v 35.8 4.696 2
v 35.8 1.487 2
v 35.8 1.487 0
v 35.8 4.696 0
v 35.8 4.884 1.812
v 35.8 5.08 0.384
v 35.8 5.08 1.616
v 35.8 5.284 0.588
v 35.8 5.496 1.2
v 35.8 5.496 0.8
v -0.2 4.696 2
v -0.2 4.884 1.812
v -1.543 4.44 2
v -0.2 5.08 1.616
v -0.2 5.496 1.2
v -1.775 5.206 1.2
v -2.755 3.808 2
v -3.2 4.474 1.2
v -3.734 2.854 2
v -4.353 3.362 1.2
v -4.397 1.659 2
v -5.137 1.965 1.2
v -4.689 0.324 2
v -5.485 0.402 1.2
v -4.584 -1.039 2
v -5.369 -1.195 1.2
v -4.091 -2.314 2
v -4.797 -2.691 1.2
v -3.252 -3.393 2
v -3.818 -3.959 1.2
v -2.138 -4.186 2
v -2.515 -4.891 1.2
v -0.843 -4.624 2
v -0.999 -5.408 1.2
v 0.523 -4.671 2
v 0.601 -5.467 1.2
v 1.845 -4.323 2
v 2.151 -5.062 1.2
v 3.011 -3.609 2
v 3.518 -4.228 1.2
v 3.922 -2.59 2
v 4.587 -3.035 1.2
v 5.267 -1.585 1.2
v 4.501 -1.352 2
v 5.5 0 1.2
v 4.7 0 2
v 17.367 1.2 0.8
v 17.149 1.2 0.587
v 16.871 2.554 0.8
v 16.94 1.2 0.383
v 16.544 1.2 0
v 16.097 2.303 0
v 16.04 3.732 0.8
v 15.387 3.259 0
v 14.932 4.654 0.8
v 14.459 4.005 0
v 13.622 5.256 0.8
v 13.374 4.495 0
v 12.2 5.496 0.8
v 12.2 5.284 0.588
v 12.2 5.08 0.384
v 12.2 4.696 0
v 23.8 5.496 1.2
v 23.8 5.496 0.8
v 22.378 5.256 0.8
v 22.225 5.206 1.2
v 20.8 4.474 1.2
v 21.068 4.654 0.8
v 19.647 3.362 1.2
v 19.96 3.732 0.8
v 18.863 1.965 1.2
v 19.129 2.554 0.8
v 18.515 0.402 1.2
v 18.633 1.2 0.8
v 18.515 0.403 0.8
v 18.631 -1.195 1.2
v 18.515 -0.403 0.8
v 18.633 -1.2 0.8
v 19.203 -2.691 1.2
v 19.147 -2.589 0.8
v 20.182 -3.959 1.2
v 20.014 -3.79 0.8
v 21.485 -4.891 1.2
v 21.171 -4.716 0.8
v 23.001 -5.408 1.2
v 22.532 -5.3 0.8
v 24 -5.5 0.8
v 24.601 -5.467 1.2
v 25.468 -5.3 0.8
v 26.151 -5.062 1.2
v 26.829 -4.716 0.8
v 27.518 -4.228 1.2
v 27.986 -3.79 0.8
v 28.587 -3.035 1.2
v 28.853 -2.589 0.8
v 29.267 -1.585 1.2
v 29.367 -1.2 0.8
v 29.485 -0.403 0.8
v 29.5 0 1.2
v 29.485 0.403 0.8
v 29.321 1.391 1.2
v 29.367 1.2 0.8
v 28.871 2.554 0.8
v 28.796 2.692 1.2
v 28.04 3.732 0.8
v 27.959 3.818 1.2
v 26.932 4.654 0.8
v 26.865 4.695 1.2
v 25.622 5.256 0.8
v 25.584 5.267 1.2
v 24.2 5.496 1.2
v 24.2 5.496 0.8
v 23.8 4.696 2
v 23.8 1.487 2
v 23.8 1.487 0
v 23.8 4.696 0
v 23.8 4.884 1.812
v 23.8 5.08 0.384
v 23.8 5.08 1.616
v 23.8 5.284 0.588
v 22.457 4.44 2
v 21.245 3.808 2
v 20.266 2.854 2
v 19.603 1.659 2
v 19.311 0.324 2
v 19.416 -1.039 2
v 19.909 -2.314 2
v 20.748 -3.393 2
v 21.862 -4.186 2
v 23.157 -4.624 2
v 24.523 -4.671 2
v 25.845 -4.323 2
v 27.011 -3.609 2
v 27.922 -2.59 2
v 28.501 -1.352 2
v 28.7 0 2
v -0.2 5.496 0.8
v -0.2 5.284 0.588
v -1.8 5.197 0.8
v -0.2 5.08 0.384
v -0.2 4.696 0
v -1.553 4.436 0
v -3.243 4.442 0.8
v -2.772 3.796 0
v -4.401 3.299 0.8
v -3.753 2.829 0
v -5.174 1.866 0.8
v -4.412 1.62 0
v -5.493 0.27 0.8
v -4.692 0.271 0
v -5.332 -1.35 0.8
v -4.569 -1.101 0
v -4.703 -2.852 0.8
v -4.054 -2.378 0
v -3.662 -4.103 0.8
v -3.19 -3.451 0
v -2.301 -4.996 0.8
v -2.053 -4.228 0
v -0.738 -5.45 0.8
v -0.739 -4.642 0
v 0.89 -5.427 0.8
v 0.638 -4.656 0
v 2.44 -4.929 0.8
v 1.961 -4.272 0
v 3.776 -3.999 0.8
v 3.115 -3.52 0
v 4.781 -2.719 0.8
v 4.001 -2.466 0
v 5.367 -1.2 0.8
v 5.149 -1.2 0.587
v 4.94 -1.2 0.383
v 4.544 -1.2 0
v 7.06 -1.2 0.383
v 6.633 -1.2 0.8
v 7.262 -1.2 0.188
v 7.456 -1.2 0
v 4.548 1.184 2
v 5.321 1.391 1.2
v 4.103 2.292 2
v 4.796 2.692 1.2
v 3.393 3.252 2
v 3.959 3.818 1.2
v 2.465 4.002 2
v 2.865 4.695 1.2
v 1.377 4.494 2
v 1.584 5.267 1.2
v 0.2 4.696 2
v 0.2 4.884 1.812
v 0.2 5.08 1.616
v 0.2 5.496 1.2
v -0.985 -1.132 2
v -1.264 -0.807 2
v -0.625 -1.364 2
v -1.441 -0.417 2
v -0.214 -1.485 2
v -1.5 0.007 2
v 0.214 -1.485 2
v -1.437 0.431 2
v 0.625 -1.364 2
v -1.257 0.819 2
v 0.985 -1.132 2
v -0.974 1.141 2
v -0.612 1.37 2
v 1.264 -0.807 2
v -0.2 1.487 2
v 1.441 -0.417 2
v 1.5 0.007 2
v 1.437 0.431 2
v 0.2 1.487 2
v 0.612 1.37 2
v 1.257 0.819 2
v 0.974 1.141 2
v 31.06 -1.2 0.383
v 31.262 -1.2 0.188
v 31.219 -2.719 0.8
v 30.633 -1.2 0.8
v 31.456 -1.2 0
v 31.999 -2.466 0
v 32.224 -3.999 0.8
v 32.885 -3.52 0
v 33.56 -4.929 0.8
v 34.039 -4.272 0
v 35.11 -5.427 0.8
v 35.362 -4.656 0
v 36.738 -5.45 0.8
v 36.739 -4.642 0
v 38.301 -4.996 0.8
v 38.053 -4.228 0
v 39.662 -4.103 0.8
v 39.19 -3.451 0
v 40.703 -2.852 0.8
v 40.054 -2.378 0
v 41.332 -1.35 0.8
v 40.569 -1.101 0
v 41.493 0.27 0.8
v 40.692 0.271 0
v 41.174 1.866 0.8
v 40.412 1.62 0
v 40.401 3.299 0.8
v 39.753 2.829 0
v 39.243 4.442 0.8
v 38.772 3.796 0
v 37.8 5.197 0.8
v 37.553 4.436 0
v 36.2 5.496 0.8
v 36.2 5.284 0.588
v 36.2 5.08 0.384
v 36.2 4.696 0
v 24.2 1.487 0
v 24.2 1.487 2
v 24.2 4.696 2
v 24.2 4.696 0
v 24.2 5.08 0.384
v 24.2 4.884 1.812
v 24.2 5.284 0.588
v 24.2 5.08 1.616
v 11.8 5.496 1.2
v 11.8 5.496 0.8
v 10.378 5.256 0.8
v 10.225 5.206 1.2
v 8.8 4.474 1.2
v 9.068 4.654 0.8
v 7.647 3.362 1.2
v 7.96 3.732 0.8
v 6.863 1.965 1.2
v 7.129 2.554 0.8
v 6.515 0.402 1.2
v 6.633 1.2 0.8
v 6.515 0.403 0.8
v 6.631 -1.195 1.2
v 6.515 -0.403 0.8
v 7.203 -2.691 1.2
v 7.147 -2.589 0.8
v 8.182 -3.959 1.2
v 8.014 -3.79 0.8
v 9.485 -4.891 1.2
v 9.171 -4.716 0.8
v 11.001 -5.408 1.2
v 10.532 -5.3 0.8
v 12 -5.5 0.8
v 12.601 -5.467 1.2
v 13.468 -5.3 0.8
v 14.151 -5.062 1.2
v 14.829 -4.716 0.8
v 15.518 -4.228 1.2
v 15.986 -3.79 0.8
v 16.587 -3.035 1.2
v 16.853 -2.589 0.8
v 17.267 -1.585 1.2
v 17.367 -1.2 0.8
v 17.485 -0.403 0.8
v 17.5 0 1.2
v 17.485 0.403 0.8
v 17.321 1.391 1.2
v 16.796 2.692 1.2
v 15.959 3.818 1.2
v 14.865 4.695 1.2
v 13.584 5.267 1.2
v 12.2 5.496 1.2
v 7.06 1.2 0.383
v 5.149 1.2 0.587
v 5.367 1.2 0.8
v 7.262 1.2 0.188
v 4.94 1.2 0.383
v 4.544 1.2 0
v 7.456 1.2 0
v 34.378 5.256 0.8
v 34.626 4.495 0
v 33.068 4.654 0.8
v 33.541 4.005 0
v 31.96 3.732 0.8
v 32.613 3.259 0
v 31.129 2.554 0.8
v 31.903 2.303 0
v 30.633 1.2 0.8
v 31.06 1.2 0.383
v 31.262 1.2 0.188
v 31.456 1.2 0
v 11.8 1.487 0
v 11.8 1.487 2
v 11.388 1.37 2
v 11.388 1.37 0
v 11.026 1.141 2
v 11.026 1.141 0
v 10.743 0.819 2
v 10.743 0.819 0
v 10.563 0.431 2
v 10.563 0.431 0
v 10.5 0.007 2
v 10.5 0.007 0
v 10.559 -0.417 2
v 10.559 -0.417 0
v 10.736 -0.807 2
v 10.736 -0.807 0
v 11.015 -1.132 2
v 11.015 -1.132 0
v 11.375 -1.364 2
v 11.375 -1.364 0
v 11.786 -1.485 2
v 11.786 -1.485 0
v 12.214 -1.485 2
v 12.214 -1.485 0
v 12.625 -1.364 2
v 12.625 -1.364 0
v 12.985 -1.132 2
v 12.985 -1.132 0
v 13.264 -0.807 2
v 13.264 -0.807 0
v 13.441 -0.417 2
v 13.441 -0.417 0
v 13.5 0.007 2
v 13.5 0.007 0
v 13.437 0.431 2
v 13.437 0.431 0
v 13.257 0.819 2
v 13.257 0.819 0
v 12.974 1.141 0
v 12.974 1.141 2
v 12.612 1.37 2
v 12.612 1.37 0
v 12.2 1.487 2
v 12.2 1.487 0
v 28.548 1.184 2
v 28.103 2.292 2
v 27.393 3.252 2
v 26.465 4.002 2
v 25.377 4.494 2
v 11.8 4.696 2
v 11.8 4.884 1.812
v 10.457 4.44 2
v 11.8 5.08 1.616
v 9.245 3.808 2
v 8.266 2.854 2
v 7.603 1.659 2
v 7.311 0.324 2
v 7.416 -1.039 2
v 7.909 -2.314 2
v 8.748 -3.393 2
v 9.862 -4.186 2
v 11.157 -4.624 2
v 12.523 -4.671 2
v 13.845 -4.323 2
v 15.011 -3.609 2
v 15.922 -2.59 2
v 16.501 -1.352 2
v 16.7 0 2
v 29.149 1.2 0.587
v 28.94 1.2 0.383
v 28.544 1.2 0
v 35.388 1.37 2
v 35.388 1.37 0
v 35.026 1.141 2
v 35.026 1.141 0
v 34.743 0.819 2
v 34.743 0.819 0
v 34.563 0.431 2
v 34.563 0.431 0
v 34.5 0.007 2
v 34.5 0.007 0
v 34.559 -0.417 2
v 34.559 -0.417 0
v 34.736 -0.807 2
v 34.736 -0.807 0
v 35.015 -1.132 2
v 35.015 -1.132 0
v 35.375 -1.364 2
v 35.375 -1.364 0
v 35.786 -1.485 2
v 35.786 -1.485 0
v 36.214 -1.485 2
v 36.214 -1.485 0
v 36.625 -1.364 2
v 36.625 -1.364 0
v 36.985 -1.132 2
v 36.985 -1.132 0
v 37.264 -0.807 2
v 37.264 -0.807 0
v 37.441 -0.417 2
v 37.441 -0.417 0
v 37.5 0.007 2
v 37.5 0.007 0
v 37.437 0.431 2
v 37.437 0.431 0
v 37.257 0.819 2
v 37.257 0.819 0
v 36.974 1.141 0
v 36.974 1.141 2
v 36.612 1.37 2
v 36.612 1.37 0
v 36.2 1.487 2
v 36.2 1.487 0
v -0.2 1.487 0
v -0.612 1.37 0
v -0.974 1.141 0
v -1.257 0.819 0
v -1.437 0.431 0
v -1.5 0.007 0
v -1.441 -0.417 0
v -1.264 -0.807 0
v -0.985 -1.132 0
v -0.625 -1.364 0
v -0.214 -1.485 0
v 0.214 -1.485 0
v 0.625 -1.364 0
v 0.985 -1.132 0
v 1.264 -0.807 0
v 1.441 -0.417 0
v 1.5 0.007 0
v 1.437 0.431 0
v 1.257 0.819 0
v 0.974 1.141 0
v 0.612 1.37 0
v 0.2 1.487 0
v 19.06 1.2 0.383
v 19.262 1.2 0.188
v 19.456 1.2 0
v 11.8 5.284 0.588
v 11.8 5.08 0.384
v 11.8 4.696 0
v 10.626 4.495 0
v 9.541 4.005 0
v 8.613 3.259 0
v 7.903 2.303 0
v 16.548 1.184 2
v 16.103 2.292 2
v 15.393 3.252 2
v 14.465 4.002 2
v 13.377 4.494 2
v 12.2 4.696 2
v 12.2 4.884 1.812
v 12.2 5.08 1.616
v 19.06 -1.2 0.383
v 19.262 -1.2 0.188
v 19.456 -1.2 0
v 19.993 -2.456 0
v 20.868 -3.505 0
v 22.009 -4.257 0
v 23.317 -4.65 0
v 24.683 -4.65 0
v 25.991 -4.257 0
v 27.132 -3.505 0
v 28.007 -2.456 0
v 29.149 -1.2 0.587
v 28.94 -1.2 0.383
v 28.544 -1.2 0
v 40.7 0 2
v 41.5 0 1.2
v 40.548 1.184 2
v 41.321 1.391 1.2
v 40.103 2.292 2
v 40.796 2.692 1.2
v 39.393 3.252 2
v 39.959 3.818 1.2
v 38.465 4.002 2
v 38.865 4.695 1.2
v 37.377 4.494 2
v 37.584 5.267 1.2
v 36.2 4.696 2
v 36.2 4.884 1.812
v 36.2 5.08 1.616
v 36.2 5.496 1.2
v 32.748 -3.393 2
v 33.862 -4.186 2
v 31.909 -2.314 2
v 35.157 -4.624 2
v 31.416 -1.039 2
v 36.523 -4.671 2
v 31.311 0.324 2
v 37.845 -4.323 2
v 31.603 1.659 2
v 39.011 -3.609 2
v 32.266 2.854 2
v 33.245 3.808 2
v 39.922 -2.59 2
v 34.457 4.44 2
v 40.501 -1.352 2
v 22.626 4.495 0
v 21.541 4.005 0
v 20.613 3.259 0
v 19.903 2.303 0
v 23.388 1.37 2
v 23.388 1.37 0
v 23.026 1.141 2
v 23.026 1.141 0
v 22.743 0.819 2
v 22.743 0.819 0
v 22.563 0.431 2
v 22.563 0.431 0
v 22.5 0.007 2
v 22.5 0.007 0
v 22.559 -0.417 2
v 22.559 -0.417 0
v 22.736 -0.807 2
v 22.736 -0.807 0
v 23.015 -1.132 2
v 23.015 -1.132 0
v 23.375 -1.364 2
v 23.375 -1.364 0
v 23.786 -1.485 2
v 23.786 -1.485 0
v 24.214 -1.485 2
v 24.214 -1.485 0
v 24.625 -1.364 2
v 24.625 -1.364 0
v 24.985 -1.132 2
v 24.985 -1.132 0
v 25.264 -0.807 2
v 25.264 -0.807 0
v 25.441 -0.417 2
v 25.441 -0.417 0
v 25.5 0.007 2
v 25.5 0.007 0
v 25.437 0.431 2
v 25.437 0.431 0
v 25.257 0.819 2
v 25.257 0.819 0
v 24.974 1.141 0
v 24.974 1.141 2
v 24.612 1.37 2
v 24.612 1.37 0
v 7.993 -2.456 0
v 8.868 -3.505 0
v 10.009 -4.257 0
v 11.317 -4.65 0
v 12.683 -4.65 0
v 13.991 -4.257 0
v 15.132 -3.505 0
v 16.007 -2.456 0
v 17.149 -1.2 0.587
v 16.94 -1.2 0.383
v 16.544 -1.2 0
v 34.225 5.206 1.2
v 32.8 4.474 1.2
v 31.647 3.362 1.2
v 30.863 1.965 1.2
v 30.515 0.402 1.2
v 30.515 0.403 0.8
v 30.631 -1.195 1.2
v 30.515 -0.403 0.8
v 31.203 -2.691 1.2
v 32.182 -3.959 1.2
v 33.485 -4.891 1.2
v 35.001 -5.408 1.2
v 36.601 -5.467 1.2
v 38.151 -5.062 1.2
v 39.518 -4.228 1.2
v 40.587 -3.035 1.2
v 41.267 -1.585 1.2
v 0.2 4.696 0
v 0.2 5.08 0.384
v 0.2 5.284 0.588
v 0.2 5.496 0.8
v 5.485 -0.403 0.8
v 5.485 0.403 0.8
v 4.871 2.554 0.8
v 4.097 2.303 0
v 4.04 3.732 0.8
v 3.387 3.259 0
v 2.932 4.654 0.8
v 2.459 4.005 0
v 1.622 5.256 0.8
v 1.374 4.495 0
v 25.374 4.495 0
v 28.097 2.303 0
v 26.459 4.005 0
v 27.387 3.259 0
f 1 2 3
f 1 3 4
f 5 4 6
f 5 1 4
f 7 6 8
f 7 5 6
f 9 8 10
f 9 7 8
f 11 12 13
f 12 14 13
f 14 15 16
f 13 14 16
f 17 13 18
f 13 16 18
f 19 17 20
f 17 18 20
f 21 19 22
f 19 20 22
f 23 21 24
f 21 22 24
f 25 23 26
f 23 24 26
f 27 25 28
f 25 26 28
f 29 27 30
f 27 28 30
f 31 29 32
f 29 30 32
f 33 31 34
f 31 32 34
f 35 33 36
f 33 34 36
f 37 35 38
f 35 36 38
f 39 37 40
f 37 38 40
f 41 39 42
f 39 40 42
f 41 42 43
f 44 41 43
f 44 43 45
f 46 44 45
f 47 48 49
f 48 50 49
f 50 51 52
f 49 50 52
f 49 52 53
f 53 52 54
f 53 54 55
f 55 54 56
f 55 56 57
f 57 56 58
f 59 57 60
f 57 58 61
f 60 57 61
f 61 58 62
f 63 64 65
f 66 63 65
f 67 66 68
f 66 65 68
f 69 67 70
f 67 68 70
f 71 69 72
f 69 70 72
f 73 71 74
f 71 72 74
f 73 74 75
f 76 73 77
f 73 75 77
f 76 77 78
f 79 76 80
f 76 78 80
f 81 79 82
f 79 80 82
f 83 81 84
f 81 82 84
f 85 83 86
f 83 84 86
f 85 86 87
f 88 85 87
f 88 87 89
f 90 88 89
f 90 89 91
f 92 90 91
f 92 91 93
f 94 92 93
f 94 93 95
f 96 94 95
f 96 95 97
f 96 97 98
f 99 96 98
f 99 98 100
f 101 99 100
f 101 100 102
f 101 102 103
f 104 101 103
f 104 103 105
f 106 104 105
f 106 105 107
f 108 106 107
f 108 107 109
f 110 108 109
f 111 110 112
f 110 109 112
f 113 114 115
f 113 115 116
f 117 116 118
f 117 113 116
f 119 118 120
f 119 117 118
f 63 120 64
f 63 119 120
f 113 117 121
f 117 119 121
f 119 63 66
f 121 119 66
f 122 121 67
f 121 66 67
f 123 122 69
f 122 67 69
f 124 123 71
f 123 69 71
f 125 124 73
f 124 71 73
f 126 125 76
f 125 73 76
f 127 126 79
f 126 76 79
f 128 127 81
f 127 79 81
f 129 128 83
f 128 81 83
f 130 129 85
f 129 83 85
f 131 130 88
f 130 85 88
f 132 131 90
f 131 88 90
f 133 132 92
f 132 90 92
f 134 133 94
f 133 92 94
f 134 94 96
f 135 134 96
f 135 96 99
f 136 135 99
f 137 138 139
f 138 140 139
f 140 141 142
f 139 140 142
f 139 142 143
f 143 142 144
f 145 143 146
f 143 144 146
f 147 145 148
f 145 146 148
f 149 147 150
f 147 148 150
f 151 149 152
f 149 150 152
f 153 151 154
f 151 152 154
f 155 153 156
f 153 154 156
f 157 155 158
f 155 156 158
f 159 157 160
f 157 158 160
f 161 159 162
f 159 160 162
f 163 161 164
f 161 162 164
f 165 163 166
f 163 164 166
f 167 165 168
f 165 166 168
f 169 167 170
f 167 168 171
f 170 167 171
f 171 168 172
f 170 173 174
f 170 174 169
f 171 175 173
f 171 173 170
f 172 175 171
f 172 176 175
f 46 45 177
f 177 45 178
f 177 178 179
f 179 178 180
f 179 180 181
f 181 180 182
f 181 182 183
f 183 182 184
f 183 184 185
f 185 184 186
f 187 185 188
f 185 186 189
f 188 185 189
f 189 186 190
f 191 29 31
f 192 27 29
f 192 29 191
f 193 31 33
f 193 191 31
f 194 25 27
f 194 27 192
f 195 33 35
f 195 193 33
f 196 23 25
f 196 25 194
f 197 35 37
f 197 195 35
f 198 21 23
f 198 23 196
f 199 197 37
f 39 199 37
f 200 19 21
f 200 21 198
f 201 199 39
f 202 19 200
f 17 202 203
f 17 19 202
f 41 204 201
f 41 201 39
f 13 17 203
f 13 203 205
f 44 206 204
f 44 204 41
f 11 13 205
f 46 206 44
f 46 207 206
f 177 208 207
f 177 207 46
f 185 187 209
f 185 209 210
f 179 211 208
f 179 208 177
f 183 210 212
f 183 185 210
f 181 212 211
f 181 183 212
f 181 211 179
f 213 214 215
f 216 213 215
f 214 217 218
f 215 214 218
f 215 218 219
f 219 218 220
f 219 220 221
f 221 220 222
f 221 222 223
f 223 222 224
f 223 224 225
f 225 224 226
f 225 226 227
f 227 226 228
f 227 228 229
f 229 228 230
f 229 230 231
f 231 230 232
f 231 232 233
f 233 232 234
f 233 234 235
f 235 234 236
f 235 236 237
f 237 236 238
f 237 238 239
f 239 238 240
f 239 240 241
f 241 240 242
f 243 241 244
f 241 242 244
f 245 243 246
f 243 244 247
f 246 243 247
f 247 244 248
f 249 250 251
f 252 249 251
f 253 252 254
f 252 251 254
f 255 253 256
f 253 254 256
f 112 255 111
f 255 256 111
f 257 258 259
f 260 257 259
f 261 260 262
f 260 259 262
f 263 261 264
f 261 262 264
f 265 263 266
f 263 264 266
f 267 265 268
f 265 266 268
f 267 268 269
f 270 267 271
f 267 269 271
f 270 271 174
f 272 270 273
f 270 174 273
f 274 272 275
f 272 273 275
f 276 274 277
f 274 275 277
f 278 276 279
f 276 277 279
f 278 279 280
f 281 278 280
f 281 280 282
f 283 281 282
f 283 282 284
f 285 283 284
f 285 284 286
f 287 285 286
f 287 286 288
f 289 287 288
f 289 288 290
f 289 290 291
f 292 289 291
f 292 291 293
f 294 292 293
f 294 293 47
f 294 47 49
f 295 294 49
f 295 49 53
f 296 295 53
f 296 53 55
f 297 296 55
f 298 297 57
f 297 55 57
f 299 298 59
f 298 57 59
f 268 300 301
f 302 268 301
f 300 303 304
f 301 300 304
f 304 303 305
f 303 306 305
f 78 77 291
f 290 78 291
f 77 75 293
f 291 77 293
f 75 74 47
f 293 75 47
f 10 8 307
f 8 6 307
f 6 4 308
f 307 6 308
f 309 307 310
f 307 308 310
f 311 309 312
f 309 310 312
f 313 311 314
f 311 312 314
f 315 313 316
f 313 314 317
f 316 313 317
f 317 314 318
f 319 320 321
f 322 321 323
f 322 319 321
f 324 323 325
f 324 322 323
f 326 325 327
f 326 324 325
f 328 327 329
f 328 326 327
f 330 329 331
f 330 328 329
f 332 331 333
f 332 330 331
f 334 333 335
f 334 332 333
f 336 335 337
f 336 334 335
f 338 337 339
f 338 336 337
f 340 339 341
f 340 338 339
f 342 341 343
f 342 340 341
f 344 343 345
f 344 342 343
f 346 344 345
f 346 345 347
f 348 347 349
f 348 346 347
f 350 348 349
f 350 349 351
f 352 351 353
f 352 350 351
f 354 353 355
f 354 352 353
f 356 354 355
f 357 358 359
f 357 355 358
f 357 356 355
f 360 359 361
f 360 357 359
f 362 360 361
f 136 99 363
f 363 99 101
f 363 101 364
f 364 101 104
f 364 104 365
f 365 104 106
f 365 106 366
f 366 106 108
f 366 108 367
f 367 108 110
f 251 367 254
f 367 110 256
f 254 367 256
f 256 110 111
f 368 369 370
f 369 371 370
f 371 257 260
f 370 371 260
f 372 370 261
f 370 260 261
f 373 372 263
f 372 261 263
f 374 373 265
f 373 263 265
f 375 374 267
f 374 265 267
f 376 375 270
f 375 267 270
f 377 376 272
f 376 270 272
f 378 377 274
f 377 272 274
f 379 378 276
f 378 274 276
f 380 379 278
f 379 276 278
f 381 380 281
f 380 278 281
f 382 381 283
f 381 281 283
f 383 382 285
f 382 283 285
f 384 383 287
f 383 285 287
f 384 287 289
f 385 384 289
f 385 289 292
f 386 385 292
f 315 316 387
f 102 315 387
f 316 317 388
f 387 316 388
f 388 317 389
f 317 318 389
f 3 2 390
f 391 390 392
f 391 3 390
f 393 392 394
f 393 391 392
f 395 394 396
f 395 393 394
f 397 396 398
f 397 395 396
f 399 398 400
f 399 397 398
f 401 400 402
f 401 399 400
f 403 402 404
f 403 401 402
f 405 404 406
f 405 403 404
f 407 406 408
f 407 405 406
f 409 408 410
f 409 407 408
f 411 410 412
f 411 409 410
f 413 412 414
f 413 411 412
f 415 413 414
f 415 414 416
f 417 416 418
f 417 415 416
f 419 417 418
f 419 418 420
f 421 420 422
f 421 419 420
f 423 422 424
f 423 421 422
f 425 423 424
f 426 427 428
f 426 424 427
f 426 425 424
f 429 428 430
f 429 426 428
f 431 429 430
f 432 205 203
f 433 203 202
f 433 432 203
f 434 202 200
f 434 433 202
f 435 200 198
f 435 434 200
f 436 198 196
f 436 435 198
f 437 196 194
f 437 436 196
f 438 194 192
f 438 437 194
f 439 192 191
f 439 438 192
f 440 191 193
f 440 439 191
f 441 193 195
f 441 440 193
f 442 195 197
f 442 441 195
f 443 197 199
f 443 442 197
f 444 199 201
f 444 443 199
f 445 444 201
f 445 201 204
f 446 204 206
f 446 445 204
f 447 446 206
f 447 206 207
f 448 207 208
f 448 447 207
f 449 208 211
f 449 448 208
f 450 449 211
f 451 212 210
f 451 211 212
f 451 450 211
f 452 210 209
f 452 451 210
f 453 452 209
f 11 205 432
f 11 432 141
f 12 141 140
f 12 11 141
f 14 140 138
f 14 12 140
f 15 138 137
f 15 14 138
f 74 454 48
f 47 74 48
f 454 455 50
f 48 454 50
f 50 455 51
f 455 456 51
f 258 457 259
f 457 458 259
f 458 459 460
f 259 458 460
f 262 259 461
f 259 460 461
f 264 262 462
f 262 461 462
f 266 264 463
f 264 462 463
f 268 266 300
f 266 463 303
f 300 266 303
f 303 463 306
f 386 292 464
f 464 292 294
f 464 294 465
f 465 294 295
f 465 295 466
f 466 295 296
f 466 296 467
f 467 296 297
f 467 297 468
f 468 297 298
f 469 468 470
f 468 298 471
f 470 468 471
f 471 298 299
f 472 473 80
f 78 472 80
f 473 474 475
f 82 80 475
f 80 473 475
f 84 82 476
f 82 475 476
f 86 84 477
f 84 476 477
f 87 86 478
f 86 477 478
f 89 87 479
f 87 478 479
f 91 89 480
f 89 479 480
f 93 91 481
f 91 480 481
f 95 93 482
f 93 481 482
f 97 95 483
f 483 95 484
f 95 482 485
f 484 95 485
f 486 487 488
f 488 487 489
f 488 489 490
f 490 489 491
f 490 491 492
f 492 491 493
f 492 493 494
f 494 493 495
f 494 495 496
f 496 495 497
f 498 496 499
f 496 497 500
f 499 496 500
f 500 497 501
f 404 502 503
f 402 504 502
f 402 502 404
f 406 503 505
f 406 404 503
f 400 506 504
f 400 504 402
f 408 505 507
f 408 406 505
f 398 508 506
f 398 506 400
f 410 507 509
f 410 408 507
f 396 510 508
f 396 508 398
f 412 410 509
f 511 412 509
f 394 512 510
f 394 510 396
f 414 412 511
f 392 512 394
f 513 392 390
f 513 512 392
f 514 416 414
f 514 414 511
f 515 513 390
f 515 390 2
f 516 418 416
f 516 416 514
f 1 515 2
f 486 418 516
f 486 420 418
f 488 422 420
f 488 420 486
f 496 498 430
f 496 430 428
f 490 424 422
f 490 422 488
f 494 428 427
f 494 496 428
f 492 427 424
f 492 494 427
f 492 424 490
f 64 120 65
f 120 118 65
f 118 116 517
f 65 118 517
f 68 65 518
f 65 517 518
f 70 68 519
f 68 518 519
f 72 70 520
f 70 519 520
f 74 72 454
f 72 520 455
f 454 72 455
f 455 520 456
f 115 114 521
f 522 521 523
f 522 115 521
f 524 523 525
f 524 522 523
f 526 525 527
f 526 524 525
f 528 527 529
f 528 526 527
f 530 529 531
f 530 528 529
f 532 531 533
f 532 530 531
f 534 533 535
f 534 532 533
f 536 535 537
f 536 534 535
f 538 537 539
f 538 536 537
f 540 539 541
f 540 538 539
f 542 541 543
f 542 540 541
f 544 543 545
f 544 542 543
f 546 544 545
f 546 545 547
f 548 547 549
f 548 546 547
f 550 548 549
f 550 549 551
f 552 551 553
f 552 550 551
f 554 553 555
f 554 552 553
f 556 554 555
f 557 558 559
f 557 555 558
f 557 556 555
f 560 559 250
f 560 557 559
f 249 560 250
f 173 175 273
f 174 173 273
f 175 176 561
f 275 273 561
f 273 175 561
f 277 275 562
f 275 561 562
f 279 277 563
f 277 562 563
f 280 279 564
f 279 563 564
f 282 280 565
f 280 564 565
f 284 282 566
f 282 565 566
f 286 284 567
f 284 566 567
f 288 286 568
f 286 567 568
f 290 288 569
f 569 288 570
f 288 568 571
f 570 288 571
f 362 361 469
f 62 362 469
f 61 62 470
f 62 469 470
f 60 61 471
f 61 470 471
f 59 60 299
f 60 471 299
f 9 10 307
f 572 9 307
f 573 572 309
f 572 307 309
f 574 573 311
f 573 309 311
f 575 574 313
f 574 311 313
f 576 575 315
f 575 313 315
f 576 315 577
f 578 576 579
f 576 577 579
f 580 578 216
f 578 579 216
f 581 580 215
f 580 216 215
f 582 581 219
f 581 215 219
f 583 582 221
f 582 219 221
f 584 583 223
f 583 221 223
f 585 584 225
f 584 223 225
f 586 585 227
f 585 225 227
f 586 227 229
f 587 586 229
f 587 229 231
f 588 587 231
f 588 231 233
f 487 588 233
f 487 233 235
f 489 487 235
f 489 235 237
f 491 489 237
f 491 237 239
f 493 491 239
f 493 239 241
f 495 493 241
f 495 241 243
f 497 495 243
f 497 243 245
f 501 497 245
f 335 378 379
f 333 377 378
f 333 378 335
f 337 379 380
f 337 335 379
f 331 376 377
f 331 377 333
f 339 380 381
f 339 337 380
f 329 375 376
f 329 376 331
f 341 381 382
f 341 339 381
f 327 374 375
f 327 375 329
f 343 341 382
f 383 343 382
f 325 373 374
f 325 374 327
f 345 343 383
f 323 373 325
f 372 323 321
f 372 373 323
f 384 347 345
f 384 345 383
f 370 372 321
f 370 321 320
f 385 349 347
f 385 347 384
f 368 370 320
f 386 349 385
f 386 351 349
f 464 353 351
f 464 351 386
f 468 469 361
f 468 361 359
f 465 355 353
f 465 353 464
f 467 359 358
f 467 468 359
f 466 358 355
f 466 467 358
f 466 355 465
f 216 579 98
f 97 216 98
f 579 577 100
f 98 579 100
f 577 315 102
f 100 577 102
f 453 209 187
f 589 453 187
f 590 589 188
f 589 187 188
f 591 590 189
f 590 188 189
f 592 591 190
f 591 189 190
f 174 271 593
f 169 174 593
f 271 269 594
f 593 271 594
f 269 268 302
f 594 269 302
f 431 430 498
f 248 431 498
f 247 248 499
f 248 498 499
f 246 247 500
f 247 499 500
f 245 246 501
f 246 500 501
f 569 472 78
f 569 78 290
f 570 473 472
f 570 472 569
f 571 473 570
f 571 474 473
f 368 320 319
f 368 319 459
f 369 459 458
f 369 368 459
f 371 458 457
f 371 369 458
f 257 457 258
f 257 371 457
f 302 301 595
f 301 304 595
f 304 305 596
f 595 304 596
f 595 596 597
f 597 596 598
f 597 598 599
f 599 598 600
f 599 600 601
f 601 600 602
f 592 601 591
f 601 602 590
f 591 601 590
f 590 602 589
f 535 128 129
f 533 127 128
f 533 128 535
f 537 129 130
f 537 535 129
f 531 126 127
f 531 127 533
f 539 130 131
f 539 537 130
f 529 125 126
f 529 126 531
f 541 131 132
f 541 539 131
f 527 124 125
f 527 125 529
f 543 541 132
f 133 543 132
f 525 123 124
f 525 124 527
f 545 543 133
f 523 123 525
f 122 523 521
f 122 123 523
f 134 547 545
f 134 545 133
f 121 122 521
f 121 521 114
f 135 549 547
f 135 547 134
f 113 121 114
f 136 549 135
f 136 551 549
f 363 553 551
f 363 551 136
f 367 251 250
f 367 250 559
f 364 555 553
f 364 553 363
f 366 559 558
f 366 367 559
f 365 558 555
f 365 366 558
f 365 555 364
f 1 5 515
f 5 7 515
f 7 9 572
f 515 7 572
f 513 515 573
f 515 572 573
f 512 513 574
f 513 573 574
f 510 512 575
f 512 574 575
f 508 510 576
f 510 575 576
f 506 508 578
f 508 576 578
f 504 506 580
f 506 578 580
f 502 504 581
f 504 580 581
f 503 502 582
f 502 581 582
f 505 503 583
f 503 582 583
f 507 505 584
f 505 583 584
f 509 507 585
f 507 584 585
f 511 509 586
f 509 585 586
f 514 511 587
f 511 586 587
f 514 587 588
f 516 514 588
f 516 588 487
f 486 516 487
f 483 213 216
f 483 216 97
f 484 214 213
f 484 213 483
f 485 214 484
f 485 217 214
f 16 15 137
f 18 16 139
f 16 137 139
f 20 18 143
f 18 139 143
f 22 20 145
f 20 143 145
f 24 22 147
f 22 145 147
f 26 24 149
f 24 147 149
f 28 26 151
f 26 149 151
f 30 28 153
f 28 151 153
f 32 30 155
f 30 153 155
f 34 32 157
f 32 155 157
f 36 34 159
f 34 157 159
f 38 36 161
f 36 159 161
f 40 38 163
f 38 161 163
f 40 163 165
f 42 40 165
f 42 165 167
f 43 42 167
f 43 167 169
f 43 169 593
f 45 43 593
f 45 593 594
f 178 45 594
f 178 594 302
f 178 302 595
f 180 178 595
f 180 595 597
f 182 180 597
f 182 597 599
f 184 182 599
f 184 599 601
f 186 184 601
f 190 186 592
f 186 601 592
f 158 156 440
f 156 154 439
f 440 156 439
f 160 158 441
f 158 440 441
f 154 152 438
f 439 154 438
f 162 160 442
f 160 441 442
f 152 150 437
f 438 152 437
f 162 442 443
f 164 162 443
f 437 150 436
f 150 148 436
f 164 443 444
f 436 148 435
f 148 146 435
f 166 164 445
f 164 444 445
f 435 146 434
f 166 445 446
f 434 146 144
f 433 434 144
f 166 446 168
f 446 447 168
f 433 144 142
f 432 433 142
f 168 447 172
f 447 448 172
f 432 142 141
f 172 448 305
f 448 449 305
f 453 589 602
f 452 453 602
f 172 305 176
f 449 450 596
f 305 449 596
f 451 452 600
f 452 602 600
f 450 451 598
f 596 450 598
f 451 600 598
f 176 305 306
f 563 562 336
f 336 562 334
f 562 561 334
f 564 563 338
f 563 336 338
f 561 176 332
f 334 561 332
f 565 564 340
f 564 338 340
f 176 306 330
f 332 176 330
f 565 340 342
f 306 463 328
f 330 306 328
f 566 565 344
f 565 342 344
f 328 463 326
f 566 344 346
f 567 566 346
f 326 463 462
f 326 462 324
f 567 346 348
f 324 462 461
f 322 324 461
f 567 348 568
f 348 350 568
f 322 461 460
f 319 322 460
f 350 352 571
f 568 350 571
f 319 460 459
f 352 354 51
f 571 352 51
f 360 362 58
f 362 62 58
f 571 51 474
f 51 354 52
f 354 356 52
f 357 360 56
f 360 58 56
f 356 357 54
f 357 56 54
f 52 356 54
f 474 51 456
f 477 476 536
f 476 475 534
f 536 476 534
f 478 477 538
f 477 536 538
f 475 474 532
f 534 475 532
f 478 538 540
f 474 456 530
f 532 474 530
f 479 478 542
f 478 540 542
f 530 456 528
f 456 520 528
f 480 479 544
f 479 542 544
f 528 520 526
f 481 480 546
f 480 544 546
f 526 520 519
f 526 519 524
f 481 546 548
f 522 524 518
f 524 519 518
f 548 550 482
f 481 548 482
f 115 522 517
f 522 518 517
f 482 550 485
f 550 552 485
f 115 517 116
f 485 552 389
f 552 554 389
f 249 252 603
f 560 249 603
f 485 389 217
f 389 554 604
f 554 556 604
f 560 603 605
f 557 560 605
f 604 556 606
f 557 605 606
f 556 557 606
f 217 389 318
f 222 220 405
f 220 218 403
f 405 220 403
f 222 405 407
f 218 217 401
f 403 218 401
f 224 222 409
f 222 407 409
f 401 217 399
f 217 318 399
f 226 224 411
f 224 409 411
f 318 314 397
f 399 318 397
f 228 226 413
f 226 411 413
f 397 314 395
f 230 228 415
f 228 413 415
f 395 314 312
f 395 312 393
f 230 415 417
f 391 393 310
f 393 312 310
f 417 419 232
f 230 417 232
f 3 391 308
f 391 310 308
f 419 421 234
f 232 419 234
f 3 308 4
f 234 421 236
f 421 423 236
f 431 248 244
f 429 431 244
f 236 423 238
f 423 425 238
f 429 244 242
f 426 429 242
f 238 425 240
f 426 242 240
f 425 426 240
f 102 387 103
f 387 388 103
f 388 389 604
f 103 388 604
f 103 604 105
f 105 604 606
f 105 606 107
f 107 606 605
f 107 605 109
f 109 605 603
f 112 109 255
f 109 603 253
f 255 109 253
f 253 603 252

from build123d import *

# Parameters (mm, degrees)
SKETCH1_R           = 5.5
SKETCH1_R_2         = 1.5
BOSS_EXTRUDE1_DEPTH = 2
SKETCH2_W           = 0.4
SKETCH2_H           = 4.013393125
CUT_EXTRUDE1_DEPTH  = 3
CHAMFER1_SIZE       = 0.8
LPATTERN1_COUNT     = 4
LPATTERN1_PITCH     = 12
SKETCH3_W           = 2.911545786
SKETCH3_H           = 2.4
BOSS_EXTRUDE2_DEPTH = 0.8


with BuildPart() as part:
    # Sketch1 → Boss-Extrude1 (new body)
    with BuildSketch(Plane.XY):
        Circle(SKETCH1_R)
        Circle(SKETCH1_R_2, mode=Mode.SUBTRACT)
    extrude(amount=BOSS_EXTRUDE1_DEPTH)

    # Sketch2 → Cut-Extrude1 (cut, through all)
    with BuildSketch(Plane.XY.offset(2)):
        with Locations((0, 3.493303437)):
            Rectangle(SKETCH2_W, SKETCH2_H)
    extrude(amount=-CUT_EXTRUDE1_DEPTH, mode=Mode.SUBTRACT)

    # Chamfer1
    chamfer1_edges = [part.edges().sort_by_distance(p)[0] for p in [
        (-3.817721834, -3.959166579, 2),
        (-3.817721834, -3.959166579, 0),
    ]]
    chamfer(chamfer1_edges, length=CHAMFER1_SIZE)


with BuildPart() as lpattern1_1:
    # LPattern1: pattern copy
    add(part.part.moved(Location(Vector(1, 0, 0) * (1 * LPATTERN1_PITCH))))


with BuildPart() as lpattern1_2:
    # LPattern1: pattern copy
    add(part.part.moved(Location(Vector(1, 0, 0) * (2 * LPATTERN1_PITCH))))


with BuildPart() as lpattern1_3:
    # LPattern1: pattern copy
    add(part.part.moved(Location(Vector(1, 0, 0) * (3 * LPATTERN1_PITCH))))


with BuildPart() as part_1:
    add(part.part)

    add(lpattern1_1.part)  # Boss-Extrude2 merges LPattern1_1

    add(lpattern1_2.part)  # Boss-Extrude2 merges LPattern1_2

    add(lpattern1_3.part)  # Boss-Extrude2 merges LPattern1_3
    # Sketch3 → Boss-Extrude2 (add)
    with BuildSketch(Plane(origin=(0, 0, 0), x_dir=(-1, 0, 0), z_dir=(0, 0, -1))):
        with Locations((-18, 0)):
            Rectangle(SKETCH3_W, SKETCH3_H)
        with Locations((-6, 0)):
            Rectangle(SKETCH3_W, SKETCH3_H)
        with Locations((-30, 0)):
            Rectangle(SKETCH3_W, SKETCH3_H)
    extrude(amount=-BOSS_EXTRUDE2_DEPTH)


solid = part_1.part
